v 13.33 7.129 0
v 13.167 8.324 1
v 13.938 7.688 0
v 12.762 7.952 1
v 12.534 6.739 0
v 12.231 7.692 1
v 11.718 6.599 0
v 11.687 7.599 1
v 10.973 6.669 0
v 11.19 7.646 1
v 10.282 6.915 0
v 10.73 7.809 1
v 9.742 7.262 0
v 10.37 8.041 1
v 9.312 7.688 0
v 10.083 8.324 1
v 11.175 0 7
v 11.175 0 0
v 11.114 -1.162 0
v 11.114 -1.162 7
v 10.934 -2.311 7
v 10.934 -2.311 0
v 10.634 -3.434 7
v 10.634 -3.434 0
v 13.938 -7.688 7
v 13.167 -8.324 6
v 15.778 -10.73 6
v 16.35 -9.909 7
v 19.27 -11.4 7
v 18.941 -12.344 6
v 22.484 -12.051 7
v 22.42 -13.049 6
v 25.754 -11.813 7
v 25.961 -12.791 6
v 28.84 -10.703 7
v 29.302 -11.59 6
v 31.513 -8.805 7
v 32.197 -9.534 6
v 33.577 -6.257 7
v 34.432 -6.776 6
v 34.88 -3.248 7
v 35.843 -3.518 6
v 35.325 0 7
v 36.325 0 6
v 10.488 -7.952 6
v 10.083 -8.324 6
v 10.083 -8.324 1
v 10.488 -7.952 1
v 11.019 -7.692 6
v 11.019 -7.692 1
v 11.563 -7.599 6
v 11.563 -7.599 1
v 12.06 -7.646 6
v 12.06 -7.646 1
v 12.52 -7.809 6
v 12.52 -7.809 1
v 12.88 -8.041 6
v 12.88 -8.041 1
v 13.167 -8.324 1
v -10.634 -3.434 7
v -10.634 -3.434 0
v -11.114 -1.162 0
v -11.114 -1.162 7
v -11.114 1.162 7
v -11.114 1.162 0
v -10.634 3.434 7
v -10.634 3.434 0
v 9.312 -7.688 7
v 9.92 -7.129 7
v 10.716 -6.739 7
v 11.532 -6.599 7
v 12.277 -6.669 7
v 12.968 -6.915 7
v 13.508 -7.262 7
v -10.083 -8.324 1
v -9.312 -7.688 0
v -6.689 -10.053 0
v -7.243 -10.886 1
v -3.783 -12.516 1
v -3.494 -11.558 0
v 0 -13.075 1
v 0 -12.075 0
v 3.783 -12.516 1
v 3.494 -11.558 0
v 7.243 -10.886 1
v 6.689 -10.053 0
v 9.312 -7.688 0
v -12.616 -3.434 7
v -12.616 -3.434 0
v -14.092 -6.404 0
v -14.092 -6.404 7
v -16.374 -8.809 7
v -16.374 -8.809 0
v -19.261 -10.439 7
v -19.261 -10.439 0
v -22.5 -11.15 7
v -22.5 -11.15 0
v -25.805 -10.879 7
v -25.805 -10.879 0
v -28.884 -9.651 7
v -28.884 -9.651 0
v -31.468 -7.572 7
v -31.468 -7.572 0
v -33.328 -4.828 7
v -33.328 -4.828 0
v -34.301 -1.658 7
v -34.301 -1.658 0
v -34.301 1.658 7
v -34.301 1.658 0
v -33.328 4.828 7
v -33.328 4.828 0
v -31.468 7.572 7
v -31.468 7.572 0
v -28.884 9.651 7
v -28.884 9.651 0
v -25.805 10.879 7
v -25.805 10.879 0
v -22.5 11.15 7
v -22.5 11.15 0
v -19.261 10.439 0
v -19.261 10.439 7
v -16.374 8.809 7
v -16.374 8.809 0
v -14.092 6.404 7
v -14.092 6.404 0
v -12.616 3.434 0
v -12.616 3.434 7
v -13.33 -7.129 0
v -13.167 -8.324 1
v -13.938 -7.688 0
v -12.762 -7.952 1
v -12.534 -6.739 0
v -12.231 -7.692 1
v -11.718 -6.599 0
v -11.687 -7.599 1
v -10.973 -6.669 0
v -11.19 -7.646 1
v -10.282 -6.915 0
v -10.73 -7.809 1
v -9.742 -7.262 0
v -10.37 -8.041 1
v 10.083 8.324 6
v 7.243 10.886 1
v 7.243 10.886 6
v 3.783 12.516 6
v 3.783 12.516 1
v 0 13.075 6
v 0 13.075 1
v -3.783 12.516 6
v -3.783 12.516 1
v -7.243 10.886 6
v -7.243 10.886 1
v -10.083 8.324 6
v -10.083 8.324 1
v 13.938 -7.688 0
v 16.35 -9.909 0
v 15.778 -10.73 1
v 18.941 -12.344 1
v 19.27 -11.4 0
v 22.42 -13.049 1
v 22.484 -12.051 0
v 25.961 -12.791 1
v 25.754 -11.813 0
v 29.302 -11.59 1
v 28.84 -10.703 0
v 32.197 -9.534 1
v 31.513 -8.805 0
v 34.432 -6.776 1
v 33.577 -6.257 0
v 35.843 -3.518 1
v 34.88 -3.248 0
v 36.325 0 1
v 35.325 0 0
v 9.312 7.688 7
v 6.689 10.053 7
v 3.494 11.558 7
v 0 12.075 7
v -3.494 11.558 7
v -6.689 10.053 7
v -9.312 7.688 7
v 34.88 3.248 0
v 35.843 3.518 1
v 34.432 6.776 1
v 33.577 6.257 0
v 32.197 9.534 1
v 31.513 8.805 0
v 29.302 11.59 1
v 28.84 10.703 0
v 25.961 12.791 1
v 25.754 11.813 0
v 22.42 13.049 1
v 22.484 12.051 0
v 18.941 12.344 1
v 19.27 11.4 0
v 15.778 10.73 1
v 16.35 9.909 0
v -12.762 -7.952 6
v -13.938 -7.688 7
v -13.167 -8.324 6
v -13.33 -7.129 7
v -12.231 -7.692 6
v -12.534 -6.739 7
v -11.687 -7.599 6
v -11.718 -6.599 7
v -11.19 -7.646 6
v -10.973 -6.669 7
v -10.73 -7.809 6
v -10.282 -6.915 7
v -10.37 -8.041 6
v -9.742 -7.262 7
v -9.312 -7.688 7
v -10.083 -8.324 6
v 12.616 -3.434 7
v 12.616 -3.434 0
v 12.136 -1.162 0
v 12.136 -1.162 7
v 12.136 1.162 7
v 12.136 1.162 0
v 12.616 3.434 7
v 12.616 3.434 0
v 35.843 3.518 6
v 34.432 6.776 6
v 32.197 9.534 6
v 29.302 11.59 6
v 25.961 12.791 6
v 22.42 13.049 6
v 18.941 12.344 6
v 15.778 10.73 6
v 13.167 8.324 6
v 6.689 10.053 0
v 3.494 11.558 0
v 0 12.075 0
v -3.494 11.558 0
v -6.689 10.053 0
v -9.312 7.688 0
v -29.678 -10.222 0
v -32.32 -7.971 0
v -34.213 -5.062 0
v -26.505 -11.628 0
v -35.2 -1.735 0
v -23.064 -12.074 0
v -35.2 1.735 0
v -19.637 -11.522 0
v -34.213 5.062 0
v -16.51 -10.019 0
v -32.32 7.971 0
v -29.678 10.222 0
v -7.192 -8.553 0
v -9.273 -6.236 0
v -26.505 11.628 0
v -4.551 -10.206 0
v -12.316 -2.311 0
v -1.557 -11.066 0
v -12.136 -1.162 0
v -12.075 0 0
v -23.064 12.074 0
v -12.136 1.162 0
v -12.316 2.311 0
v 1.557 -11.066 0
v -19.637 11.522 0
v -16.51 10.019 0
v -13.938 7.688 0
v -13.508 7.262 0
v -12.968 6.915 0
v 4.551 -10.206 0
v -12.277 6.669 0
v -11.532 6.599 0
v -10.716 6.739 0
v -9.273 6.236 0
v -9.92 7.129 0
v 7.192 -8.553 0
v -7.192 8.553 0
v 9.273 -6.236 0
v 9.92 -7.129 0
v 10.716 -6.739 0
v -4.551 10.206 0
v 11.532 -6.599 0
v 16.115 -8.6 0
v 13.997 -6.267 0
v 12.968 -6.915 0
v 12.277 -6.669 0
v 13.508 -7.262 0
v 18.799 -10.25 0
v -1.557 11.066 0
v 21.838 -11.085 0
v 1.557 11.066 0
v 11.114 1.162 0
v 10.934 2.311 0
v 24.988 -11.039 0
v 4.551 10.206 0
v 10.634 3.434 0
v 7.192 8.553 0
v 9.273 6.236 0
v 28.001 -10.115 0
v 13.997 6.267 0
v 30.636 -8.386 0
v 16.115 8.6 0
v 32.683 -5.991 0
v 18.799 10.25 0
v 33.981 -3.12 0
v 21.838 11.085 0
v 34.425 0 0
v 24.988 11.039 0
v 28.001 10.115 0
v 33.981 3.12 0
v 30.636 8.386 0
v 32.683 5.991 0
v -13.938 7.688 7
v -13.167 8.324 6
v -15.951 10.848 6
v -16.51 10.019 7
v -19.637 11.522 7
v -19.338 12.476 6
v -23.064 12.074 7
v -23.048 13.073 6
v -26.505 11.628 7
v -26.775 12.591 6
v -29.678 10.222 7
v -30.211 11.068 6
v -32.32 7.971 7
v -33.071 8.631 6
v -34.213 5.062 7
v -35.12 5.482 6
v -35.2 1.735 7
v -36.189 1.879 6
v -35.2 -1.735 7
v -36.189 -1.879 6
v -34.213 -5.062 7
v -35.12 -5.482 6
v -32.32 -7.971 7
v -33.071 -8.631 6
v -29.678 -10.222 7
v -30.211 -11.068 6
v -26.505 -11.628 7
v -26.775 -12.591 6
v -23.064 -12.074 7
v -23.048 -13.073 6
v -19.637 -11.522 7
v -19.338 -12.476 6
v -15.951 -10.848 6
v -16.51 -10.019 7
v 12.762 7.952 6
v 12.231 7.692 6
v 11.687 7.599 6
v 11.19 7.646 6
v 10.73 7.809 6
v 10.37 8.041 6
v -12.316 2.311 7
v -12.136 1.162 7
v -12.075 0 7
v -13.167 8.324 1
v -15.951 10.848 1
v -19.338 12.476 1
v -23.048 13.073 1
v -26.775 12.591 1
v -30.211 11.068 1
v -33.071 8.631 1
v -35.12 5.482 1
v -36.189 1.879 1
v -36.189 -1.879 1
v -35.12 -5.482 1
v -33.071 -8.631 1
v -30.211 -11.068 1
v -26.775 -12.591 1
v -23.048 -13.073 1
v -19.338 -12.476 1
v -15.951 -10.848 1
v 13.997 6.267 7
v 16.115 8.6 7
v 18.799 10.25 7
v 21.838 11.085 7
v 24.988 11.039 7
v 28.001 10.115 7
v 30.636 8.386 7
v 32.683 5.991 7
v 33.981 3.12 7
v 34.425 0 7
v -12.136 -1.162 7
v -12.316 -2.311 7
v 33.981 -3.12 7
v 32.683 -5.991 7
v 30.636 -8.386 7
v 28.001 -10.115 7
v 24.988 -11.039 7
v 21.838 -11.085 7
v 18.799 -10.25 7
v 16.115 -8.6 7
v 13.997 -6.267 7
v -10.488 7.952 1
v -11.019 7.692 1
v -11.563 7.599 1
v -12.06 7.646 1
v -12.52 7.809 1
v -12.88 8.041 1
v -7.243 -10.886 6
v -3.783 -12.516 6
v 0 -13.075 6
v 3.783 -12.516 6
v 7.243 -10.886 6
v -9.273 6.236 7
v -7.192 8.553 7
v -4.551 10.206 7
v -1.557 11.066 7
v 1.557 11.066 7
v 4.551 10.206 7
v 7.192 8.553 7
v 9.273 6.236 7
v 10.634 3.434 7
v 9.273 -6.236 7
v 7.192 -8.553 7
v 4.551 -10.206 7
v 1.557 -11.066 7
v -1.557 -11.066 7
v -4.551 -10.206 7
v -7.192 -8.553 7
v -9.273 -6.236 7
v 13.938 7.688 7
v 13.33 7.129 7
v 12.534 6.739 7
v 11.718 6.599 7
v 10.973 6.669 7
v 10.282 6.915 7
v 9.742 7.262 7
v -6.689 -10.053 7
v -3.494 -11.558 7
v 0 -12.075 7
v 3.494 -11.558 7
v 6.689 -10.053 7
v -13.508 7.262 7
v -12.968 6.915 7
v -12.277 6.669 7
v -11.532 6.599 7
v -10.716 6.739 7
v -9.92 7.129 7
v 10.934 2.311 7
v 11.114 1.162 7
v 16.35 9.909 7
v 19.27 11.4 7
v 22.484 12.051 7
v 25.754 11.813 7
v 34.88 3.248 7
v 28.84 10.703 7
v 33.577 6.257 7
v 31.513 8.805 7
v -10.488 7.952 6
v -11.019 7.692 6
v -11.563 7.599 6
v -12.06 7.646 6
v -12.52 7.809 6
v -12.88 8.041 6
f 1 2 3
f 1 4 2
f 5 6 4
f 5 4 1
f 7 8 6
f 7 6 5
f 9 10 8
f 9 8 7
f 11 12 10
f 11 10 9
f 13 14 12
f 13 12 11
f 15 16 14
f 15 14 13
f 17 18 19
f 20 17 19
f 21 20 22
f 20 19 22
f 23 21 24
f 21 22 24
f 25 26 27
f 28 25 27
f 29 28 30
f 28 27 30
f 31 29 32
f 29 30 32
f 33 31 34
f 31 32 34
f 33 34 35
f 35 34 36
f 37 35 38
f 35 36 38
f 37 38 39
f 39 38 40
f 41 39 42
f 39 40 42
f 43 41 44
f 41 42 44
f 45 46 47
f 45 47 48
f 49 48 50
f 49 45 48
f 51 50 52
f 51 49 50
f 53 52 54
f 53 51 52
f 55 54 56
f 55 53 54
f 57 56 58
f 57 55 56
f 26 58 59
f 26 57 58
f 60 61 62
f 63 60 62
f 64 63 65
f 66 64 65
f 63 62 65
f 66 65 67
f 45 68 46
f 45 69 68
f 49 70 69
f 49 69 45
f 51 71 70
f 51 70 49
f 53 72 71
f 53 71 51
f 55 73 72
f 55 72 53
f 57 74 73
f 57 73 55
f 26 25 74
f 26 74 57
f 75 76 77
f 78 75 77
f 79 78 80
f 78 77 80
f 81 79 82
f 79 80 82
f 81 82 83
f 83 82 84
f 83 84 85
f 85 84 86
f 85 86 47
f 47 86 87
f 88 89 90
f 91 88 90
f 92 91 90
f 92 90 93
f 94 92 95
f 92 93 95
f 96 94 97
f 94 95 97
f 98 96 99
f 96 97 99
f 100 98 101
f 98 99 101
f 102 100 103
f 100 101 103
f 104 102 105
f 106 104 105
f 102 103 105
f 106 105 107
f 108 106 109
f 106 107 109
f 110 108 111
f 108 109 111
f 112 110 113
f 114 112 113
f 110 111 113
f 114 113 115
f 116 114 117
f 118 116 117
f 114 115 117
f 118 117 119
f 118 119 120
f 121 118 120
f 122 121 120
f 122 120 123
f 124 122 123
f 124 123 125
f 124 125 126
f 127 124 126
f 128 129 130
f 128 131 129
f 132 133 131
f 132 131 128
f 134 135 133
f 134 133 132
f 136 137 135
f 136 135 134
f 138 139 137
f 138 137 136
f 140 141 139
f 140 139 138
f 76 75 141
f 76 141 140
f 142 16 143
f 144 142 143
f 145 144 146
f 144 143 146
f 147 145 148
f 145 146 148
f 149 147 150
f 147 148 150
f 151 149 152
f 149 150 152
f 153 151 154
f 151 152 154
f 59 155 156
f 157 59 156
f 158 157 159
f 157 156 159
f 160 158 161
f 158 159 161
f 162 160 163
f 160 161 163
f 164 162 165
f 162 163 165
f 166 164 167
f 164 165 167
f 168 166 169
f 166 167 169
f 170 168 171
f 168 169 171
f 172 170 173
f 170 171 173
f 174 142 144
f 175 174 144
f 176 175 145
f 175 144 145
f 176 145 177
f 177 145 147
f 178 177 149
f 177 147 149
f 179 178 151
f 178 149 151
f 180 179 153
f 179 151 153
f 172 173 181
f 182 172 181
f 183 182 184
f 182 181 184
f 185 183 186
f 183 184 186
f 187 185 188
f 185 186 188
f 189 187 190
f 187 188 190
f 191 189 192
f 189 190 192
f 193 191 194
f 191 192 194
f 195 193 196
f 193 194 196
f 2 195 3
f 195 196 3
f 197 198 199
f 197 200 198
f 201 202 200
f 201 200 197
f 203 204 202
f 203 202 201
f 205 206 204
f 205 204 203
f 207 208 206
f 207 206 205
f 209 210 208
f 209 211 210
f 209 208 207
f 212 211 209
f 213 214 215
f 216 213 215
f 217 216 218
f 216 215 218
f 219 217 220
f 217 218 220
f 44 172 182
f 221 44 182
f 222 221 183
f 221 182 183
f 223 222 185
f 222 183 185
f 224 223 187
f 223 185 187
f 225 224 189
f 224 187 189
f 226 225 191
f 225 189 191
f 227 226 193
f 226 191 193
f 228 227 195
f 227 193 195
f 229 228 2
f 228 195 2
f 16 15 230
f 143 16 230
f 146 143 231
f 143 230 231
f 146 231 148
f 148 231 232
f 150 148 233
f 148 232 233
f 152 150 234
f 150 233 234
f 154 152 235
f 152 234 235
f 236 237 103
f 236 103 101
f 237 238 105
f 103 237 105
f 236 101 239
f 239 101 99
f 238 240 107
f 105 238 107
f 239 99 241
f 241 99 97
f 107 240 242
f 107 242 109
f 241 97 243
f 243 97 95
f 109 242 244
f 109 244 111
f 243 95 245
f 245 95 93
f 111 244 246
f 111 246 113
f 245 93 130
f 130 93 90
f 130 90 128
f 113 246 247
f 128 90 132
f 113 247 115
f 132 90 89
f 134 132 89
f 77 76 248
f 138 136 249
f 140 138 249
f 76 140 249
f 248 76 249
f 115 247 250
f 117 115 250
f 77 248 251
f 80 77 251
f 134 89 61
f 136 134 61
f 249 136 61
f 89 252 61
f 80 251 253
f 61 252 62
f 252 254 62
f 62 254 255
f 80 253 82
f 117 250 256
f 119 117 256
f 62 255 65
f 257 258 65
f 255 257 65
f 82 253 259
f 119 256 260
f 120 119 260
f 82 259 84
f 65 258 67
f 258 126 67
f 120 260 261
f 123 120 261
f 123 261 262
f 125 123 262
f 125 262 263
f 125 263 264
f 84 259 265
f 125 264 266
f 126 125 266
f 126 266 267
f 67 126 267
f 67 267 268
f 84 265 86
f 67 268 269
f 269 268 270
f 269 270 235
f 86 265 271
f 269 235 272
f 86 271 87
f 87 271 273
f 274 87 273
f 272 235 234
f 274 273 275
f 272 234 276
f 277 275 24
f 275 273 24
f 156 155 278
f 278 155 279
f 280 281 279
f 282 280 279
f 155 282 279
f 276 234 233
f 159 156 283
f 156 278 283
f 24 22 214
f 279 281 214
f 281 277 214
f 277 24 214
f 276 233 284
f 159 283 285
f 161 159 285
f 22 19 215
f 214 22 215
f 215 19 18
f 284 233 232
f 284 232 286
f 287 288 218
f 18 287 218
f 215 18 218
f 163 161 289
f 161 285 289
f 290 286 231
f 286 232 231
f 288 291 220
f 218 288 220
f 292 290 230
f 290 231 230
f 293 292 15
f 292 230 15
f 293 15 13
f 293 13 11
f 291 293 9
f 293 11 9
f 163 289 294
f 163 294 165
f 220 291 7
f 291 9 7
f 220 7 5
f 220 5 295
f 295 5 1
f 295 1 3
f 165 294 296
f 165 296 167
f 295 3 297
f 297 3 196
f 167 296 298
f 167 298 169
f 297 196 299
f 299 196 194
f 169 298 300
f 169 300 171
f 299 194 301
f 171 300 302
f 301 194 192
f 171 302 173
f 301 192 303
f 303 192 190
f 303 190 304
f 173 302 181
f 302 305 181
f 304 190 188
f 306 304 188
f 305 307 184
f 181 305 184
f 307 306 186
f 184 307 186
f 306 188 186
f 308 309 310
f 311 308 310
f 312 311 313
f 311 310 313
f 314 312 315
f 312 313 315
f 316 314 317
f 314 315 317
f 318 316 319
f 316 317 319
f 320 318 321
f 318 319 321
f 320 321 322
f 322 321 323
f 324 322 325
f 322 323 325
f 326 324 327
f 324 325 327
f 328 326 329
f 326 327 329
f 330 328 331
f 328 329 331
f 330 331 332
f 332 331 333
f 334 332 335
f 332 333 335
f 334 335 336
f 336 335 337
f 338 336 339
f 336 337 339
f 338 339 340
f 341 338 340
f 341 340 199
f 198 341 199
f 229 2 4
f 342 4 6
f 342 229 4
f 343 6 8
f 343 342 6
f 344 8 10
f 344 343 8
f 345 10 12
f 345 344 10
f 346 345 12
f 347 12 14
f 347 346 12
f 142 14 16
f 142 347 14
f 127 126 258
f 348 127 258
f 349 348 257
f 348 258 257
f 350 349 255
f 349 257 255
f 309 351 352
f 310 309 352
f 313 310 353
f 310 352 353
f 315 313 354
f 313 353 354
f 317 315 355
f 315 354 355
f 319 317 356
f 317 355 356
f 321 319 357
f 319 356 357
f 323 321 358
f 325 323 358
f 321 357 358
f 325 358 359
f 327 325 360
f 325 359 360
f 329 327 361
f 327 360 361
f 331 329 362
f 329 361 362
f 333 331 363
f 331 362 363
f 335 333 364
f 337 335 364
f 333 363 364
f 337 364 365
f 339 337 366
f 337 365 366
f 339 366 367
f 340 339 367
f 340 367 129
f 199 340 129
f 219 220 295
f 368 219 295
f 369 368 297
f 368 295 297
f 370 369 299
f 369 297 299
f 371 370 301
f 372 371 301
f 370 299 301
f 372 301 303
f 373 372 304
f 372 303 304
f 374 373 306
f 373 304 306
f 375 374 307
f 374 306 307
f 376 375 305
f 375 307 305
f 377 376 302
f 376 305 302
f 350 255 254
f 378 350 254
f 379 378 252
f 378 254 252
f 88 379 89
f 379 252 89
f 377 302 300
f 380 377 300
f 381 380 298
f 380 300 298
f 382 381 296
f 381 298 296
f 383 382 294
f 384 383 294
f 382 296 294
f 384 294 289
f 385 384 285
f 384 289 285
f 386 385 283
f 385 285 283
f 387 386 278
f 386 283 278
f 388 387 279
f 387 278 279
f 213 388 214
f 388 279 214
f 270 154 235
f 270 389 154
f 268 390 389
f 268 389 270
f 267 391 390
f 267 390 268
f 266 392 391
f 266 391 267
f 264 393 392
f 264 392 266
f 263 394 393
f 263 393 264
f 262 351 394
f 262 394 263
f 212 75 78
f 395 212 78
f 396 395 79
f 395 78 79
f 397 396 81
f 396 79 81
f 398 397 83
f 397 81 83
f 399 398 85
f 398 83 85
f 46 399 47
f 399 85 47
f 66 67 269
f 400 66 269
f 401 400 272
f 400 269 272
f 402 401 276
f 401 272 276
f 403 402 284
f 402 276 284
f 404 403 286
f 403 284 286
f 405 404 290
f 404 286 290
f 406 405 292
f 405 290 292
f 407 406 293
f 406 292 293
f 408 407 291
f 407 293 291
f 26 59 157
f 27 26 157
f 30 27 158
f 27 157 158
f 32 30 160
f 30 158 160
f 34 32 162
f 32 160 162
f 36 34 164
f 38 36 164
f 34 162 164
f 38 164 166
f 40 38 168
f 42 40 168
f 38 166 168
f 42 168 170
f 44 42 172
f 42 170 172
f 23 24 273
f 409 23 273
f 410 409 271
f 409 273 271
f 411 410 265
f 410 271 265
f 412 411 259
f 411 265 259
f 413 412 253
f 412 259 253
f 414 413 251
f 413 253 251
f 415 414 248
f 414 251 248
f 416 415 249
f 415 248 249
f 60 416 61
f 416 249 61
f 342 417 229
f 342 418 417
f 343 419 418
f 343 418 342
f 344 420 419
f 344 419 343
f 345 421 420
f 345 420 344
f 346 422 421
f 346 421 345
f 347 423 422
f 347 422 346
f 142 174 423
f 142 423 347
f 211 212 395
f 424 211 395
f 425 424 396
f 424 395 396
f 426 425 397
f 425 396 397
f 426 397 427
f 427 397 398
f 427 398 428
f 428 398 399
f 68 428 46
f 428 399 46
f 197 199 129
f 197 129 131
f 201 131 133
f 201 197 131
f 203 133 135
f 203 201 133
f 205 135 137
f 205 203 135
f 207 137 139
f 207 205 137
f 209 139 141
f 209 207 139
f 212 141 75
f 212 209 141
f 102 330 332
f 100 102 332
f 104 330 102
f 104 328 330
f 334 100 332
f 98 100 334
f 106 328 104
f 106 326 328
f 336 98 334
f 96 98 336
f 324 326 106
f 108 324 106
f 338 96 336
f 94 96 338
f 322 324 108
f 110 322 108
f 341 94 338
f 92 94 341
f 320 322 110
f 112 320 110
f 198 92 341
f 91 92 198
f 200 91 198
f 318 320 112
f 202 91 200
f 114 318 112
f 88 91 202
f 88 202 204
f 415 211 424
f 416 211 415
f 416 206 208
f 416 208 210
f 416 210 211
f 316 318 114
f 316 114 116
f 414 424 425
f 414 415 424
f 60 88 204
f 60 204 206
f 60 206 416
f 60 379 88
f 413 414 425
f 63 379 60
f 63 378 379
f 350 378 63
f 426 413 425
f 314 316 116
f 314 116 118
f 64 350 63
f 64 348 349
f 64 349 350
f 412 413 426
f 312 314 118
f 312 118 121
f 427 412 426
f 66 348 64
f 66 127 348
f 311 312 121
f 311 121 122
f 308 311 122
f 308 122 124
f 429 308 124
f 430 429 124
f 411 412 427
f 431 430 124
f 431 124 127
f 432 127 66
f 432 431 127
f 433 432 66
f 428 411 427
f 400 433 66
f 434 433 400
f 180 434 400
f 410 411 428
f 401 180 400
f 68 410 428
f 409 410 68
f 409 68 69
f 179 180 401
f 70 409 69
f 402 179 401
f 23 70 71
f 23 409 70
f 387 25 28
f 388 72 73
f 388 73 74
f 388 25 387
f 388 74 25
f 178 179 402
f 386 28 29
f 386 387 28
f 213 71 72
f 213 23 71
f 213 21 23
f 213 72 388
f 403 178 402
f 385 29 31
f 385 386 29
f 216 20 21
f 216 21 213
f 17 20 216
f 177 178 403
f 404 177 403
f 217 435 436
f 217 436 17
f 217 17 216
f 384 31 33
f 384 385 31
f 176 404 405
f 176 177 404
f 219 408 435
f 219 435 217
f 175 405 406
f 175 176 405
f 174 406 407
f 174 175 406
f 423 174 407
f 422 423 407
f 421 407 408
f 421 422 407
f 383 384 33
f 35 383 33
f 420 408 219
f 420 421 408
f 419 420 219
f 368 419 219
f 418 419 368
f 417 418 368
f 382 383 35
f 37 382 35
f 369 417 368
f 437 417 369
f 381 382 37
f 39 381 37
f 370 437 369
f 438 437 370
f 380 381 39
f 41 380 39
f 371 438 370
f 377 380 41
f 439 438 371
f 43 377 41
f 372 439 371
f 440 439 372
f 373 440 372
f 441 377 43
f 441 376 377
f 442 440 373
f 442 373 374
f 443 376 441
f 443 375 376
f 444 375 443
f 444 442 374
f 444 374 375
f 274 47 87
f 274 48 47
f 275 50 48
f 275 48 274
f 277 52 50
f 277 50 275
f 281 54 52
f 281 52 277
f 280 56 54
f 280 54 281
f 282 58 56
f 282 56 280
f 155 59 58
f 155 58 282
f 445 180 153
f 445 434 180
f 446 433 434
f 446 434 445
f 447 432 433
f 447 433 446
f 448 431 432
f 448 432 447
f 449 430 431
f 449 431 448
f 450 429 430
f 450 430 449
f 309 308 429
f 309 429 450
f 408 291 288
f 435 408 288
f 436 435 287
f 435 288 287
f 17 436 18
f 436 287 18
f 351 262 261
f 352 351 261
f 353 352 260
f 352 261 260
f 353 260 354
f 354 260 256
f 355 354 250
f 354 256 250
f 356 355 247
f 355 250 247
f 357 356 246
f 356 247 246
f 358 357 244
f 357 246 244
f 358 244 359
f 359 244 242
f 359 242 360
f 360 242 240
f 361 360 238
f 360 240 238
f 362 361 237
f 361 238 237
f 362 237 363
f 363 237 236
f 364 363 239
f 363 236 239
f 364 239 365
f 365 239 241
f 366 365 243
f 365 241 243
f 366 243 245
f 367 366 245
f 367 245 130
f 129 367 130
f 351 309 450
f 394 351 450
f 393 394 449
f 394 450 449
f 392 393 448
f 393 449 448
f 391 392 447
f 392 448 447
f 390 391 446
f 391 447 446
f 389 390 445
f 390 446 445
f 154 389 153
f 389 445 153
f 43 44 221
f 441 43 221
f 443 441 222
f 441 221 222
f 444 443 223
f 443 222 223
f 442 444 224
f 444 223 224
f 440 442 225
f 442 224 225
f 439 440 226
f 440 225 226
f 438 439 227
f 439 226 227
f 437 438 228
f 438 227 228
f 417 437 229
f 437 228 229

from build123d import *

# Parameters (mm, degrees)
F1_DEPTH = 7
F2_R     = 2
F3_SIZE  = 1


with BuildPart() as f1:
    # F0 (on Top) → F1 (new body)
    with BuildSketch(Plane.XY):
        with BuildLine():
            ThreePointArc((-12.6158602151, 3.4344862839), (-12.1873110001, 4.7355121779), (-11.625, 5.9845634761))
            ThreePointArc((-11.625, 5.9845634761), (-36.325, 0), (-11.625, -5.9845634761))
            ThreePointArc((-11.625, -5.9845634761), (-12.1873110001, -4.7355121779), (-12.6158602151, -3.4344862839))
            ThreePointArc((-12.6158602151, -3.4344862839), (-34.425, 0), (-12.6158602151, 3.4344862839))
        make_face()
        with BuildLine():
            ThreePointArc((-10.6341397849, 3.4344862839), (0, 11.175), (10.6341397849, 3.4344862839))
            ThreePointArc((10.6341397849, 3.4344862839), (11.0626889999, 4.7355121779), (11.625, 5.9845634761))
            ThreePointArc((11.625, 5.9845634761), (0, 13.075), (-11.625, 5.9845634761))
            ThreePointArc((-11.625, 5.9845634761), (-11.0626889999, 4.7355121779), (-10.6341397849, 3.4344862839))
        make_face()
        with BuildLine():
            ThreePointArc((36.325, 0), (26.3288593667, 12.7073305615), (11.625, 5.9845634761))
            ThreePointArc((11.625, 5.9845634761), (12.1873110001, 4.7355121779), (12.6158602151, 3.4344862839))
            ThreePointArc((12.6158602151, 3.4344862839), (24.9884062965, 11.0389568596), (34.425, 0))
            ThreePointArc((34.425, 0), (24.9884062965, -11.0389568596), (12.6158602151, -3.4344862839))
            ThreePointArc((12.6158602151, -3.4344862839), (12.1873110001, -4.7355121779), (11.625, -5.9845634761))
            ThreePointArc((11.625, -5.9845634761), (26.3288593667, -12.7073305615), (36.325, 0))
        make_face()
        with BuildLine():
            ThreePointArc((11.625, -5.9845634761), (11.0626889999, -4.7355121779), (10.6341397849, -3.4344862839))
            ThreePointArc((10.6341397849, -3.4344862839), (0, -11.175), (-10.6341397849, -3.4344862839))
            ThreePointArc((-10.6341397849, -3.4344862839), (-11.0626889999, -4.7355121779), (-11.625, -5.9845634761))
            ThreePointArc((-11.625, -5.9845634761), (0, -13.075), (11.625, -5.9845634761))
        make_face()
        with BuildLine():
            ThreePointArc((10.6341397849, 3.4344862839), (11.0389568596, 1.7384062965), (11.175, 0))
            ThreePointArc((11.175, 0), (11.0389568596, -1.7384062965), (10.6341397849, -3.4344862839))
            ThreePointArc((10.6341397849, -3.4344862839), (11.0626889999, -4.7355121779), (11.625, -5.9845634761))
            ThreePointArc((11.625, -5.9845634761), (12.1873110001, -4.7355121779), (12.6158602151, -3.4344862839))
            ThreePointArc((12.6158602151, -3.4344862839), (12.075, 0), (12.6158602151, 3.4344862839))
            ThreePointArc((12.6158602151, 3.4344862839), (12.1873110001, 4.7355121779), (11.625, 5.9845634761))
            ThreePointArc((11.625, 5.9845634761), (11.0626889999, 4.7355121779), (10.6341397849, 3.4344862839))
        make_face()
        with BuildLine():
            ThreePointArc((-10.6341397849, -3.4344862839), (-11.175, 0), (-10.6341397849, 3.4344862839))
            ThreePointArc((-10.6341397849, 3.4344862839), (-11.0626889999, 4.7355121779), (-11.625, 5.9845634761))
            ThreePointArc((-11.625, 5.9845634761), (-12.1873110001, 4.7355121779), (-12.6158602151, 3.4344862839))
            ThreePointArc((-12.6158602151, 3.4344862839), (-12.2110431404, 1.7384062965), (-12.075, 0))
            ThreePointArc((-12.075, 0), (-12.2110431404, -1.7384062965), (-12.6158602151, -3.4344862839))
            ThreePointArc((-12.6158602151, -3.4344862839), (-12.1873110001, -4.7355121779), (-11.625, -5.9845634761))
            ThreePointArc((-11.625, -5.9845634761), (-11.0626889999, -4.7355121779), (-10.6341397849, -3.4344862839))
        make_face()
    extrude(amount=F1_DEPTH)

    # F2
    f2_edges = [f1.edges().sort_by_distance(p)[0] for p in [
        (-11.625, -5.984563, 3.5),
        (11.625, -5.984563, 3.5),
        (-11.625, 5.984563, 3.5),
        (11.625, 5.984563, 3.5),
    ]]
    fillet(f2_edges, radius=F2_R)

    # F3
    f3_edges = [f1.edges().sort_by_distance(p)[0] for p in [
        (0, -13.075, 7),
        (-36.325, 0, 0),
    ]]
    chamfer(f3_edges, length=F3_SIZE)


solid = f1.part
